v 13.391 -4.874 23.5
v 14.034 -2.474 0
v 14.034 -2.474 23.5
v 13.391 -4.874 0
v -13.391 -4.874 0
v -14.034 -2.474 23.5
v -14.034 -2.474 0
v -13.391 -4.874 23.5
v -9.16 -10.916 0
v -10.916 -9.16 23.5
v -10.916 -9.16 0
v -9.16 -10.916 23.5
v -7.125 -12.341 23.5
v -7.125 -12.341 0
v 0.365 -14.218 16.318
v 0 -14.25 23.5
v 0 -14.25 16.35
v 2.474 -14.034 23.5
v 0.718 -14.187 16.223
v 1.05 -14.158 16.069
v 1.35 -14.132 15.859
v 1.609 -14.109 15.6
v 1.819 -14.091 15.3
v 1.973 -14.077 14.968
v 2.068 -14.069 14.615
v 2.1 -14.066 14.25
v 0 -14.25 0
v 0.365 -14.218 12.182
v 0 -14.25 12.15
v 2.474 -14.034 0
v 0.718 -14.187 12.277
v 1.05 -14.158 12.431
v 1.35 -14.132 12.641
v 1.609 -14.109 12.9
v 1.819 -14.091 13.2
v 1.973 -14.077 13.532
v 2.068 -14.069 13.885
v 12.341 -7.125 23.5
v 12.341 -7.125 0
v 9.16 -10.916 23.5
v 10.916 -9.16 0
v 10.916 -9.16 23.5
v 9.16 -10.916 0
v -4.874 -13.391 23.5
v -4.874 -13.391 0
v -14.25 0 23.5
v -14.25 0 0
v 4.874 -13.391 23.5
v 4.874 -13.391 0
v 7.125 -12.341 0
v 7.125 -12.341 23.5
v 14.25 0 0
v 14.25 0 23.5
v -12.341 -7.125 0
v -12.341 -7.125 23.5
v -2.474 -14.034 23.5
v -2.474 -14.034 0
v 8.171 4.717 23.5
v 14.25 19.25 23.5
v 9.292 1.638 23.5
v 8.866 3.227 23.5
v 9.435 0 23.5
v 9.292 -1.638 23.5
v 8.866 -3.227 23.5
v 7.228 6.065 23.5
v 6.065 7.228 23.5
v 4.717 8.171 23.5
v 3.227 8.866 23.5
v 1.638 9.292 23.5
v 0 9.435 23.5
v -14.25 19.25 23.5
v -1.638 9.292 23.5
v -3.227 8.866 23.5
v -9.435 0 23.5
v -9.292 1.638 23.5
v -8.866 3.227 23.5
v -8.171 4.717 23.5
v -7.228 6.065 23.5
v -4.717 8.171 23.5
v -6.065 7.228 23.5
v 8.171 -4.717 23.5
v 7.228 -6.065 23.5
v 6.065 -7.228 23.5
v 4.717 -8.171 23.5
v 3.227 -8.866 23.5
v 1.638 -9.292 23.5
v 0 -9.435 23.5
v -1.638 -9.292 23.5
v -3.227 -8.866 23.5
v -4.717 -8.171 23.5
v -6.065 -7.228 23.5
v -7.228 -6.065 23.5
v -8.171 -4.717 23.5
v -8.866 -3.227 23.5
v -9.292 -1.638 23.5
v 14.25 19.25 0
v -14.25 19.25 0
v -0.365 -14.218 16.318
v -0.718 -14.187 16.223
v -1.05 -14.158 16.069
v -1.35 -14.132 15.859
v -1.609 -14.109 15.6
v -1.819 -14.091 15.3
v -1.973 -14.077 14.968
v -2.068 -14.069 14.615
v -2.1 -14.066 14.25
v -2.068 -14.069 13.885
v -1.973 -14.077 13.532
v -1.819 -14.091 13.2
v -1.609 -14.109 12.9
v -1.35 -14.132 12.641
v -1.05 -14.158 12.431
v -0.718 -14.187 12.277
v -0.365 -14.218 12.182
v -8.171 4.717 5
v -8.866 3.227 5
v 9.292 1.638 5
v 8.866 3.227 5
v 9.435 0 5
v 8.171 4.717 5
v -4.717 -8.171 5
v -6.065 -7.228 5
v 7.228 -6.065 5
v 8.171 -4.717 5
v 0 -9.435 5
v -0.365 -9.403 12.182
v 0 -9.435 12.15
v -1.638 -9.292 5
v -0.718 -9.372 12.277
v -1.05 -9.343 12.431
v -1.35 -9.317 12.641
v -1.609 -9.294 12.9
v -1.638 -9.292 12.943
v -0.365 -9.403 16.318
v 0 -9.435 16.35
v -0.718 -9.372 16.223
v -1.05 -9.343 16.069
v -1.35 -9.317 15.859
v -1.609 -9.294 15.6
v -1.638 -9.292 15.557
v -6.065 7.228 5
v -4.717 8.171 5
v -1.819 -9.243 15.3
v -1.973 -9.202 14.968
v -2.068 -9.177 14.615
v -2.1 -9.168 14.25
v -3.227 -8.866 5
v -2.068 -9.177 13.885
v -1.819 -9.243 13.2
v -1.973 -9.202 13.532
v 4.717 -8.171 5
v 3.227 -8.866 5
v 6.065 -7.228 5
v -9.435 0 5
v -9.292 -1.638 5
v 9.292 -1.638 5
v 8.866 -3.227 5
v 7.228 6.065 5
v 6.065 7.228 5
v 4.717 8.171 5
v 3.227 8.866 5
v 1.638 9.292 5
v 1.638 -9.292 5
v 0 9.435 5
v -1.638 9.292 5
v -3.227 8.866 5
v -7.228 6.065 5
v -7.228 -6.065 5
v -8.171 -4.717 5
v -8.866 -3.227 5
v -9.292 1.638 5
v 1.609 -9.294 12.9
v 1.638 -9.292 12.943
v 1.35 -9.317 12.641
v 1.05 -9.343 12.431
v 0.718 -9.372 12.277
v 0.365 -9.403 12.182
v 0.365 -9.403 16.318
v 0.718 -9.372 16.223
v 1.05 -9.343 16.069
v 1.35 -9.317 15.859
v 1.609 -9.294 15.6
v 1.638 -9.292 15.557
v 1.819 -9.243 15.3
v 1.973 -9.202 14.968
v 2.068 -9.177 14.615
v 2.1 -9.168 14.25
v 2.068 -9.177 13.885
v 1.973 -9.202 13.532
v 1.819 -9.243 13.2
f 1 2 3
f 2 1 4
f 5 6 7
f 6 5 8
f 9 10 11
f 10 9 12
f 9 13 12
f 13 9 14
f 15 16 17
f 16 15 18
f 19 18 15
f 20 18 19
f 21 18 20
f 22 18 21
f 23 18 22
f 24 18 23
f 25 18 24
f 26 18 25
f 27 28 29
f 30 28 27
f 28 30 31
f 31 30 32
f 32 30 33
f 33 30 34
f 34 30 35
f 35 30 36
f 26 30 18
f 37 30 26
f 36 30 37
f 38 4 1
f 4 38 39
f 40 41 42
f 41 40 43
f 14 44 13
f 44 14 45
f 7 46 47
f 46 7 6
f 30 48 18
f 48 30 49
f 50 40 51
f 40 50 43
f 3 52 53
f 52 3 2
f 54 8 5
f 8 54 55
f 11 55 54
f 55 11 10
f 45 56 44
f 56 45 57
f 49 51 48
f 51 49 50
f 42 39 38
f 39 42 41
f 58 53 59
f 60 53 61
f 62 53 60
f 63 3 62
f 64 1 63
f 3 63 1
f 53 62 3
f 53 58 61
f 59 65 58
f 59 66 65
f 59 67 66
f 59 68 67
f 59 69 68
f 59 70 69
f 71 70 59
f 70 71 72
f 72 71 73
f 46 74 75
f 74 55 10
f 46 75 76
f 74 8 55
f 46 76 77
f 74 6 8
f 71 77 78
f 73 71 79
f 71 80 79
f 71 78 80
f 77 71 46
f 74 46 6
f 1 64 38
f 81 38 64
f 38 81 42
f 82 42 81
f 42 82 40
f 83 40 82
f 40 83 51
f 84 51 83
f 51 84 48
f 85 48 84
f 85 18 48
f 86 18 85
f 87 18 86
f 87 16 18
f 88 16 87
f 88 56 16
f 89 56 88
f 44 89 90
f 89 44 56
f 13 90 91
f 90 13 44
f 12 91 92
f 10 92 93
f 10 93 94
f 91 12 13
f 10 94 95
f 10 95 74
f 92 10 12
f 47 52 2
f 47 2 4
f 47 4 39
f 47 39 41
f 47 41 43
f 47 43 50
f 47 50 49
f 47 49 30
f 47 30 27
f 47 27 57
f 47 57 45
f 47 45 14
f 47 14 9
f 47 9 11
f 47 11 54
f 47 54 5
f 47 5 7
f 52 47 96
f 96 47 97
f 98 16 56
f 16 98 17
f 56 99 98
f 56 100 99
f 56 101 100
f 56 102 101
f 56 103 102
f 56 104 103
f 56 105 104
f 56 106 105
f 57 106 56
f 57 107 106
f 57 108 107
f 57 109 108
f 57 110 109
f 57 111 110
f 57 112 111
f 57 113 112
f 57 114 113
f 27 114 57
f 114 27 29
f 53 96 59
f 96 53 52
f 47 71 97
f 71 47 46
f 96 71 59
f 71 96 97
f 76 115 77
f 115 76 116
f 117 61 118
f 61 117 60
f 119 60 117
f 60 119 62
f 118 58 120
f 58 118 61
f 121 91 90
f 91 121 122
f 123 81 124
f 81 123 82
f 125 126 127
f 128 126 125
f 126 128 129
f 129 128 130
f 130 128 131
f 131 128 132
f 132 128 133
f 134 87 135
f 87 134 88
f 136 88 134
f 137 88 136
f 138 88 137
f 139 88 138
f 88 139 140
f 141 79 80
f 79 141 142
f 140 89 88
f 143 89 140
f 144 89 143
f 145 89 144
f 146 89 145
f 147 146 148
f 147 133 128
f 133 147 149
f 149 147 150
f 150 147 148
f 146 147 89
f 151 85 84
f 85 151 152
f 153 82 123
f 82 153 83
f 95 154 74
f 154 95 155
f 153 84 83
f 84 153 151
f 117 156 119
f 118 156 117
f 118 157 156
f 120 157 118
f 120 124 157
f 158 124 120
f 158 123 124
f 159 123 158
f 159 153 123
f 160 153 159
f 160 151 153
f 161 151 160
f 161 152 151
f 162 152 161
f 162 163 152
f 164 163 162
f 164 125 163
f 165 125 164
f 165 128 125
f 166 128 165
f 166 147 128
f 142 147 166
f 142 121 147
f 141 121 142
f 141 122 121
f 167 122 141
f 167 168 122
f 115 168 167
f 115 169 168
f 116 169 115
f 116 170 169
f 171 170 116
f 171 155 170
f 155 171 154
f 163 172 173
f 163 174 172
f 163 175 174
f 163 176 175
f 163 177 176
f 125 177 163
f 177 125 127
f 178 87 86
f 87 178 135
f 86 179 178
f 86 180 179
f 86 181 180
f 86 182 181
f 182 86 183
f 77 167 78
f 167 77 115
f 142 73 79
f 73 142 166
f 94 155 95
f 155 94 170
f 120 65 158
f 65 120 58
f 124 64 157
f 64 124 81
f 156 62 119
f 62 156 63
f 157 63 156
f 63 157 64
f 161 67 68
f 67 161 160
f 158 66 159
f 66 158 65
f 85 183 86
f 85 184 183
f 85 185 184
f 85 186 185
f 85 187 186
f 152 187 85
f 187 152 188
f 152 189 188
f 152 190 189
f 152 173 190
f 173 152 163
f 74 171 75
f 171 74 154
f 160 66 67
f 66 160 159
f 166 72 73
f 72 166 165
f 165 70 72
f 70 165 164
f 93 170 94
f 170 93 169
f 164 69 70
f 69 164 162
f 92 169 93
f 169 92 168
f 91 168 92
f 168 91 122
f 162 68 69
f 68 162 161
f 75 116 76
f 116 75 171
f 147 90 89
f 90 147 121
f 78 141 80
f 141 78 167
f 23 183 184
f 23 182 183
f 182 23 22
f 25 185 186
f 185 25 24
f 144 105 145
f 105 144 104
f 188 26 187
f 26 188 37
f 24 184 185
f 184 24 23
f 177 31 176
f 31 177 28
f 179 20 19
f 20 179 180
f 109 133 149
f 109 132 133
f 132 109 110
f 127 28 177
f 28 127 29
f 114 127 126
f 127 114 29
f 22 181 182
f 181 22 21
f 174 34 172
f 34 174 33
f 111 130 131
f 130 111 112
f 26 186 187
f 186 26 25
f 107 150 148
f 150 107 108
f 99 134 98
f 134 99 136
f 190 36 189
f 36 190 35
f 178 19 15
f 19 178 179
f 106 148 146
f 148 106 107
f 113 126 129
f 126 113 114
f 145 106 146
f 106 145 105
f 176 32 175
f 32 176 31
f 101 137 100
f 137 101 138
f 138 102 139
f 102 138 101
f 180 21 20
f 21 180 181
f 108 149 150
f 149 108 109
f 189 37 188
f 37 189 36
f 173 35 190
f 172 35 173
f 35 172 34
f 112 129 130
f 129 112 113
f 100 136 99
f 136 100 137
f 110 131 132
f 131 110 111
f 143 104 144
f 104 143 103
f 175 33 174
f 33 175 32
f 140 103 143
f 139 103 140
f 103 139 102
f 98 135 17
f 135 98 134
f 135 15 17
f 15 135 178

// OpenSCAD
/* [Body] */
Shell_Thickness = 5;

/* [Conduit] */
Conduit_Diameter = 18.5;
Printer_Fudge = 1.02;
/* [Hardware] */ 
Screw_thread = 3;
Heatset_Diameter = 4.2;
/* [Hidden] */
$fn=36;

difference() {
    union() {
        cylinder(h = Conduit_Diameter+Shell_Thickness, d=Conduit_Diameter+Shell_Thickness*2);
        translate([-(Conduit_Diameter+Shell_Thickness*2)/2,0,0]) cube([Conduit_Diameter+Shell_Thickness*2,Conduit_Diameter/2+Shell_Thickness*2,Conduit_Diameter+Shell_Thickness]);
    }
    #translate([0,0,Shell_Thickness]) cylinder(h=Conduit_Diameter+0.01, d=Conduit_Diameter*Printer_Fudge);
    translate([0,-(Conduit_Diameter/2-1),Conduit_Diameter*.5+Shell_Thickness])#rotate([90,0,0]) cylinder(h = Shell_Thickness+2, d=Heatset_Diameter);

}
